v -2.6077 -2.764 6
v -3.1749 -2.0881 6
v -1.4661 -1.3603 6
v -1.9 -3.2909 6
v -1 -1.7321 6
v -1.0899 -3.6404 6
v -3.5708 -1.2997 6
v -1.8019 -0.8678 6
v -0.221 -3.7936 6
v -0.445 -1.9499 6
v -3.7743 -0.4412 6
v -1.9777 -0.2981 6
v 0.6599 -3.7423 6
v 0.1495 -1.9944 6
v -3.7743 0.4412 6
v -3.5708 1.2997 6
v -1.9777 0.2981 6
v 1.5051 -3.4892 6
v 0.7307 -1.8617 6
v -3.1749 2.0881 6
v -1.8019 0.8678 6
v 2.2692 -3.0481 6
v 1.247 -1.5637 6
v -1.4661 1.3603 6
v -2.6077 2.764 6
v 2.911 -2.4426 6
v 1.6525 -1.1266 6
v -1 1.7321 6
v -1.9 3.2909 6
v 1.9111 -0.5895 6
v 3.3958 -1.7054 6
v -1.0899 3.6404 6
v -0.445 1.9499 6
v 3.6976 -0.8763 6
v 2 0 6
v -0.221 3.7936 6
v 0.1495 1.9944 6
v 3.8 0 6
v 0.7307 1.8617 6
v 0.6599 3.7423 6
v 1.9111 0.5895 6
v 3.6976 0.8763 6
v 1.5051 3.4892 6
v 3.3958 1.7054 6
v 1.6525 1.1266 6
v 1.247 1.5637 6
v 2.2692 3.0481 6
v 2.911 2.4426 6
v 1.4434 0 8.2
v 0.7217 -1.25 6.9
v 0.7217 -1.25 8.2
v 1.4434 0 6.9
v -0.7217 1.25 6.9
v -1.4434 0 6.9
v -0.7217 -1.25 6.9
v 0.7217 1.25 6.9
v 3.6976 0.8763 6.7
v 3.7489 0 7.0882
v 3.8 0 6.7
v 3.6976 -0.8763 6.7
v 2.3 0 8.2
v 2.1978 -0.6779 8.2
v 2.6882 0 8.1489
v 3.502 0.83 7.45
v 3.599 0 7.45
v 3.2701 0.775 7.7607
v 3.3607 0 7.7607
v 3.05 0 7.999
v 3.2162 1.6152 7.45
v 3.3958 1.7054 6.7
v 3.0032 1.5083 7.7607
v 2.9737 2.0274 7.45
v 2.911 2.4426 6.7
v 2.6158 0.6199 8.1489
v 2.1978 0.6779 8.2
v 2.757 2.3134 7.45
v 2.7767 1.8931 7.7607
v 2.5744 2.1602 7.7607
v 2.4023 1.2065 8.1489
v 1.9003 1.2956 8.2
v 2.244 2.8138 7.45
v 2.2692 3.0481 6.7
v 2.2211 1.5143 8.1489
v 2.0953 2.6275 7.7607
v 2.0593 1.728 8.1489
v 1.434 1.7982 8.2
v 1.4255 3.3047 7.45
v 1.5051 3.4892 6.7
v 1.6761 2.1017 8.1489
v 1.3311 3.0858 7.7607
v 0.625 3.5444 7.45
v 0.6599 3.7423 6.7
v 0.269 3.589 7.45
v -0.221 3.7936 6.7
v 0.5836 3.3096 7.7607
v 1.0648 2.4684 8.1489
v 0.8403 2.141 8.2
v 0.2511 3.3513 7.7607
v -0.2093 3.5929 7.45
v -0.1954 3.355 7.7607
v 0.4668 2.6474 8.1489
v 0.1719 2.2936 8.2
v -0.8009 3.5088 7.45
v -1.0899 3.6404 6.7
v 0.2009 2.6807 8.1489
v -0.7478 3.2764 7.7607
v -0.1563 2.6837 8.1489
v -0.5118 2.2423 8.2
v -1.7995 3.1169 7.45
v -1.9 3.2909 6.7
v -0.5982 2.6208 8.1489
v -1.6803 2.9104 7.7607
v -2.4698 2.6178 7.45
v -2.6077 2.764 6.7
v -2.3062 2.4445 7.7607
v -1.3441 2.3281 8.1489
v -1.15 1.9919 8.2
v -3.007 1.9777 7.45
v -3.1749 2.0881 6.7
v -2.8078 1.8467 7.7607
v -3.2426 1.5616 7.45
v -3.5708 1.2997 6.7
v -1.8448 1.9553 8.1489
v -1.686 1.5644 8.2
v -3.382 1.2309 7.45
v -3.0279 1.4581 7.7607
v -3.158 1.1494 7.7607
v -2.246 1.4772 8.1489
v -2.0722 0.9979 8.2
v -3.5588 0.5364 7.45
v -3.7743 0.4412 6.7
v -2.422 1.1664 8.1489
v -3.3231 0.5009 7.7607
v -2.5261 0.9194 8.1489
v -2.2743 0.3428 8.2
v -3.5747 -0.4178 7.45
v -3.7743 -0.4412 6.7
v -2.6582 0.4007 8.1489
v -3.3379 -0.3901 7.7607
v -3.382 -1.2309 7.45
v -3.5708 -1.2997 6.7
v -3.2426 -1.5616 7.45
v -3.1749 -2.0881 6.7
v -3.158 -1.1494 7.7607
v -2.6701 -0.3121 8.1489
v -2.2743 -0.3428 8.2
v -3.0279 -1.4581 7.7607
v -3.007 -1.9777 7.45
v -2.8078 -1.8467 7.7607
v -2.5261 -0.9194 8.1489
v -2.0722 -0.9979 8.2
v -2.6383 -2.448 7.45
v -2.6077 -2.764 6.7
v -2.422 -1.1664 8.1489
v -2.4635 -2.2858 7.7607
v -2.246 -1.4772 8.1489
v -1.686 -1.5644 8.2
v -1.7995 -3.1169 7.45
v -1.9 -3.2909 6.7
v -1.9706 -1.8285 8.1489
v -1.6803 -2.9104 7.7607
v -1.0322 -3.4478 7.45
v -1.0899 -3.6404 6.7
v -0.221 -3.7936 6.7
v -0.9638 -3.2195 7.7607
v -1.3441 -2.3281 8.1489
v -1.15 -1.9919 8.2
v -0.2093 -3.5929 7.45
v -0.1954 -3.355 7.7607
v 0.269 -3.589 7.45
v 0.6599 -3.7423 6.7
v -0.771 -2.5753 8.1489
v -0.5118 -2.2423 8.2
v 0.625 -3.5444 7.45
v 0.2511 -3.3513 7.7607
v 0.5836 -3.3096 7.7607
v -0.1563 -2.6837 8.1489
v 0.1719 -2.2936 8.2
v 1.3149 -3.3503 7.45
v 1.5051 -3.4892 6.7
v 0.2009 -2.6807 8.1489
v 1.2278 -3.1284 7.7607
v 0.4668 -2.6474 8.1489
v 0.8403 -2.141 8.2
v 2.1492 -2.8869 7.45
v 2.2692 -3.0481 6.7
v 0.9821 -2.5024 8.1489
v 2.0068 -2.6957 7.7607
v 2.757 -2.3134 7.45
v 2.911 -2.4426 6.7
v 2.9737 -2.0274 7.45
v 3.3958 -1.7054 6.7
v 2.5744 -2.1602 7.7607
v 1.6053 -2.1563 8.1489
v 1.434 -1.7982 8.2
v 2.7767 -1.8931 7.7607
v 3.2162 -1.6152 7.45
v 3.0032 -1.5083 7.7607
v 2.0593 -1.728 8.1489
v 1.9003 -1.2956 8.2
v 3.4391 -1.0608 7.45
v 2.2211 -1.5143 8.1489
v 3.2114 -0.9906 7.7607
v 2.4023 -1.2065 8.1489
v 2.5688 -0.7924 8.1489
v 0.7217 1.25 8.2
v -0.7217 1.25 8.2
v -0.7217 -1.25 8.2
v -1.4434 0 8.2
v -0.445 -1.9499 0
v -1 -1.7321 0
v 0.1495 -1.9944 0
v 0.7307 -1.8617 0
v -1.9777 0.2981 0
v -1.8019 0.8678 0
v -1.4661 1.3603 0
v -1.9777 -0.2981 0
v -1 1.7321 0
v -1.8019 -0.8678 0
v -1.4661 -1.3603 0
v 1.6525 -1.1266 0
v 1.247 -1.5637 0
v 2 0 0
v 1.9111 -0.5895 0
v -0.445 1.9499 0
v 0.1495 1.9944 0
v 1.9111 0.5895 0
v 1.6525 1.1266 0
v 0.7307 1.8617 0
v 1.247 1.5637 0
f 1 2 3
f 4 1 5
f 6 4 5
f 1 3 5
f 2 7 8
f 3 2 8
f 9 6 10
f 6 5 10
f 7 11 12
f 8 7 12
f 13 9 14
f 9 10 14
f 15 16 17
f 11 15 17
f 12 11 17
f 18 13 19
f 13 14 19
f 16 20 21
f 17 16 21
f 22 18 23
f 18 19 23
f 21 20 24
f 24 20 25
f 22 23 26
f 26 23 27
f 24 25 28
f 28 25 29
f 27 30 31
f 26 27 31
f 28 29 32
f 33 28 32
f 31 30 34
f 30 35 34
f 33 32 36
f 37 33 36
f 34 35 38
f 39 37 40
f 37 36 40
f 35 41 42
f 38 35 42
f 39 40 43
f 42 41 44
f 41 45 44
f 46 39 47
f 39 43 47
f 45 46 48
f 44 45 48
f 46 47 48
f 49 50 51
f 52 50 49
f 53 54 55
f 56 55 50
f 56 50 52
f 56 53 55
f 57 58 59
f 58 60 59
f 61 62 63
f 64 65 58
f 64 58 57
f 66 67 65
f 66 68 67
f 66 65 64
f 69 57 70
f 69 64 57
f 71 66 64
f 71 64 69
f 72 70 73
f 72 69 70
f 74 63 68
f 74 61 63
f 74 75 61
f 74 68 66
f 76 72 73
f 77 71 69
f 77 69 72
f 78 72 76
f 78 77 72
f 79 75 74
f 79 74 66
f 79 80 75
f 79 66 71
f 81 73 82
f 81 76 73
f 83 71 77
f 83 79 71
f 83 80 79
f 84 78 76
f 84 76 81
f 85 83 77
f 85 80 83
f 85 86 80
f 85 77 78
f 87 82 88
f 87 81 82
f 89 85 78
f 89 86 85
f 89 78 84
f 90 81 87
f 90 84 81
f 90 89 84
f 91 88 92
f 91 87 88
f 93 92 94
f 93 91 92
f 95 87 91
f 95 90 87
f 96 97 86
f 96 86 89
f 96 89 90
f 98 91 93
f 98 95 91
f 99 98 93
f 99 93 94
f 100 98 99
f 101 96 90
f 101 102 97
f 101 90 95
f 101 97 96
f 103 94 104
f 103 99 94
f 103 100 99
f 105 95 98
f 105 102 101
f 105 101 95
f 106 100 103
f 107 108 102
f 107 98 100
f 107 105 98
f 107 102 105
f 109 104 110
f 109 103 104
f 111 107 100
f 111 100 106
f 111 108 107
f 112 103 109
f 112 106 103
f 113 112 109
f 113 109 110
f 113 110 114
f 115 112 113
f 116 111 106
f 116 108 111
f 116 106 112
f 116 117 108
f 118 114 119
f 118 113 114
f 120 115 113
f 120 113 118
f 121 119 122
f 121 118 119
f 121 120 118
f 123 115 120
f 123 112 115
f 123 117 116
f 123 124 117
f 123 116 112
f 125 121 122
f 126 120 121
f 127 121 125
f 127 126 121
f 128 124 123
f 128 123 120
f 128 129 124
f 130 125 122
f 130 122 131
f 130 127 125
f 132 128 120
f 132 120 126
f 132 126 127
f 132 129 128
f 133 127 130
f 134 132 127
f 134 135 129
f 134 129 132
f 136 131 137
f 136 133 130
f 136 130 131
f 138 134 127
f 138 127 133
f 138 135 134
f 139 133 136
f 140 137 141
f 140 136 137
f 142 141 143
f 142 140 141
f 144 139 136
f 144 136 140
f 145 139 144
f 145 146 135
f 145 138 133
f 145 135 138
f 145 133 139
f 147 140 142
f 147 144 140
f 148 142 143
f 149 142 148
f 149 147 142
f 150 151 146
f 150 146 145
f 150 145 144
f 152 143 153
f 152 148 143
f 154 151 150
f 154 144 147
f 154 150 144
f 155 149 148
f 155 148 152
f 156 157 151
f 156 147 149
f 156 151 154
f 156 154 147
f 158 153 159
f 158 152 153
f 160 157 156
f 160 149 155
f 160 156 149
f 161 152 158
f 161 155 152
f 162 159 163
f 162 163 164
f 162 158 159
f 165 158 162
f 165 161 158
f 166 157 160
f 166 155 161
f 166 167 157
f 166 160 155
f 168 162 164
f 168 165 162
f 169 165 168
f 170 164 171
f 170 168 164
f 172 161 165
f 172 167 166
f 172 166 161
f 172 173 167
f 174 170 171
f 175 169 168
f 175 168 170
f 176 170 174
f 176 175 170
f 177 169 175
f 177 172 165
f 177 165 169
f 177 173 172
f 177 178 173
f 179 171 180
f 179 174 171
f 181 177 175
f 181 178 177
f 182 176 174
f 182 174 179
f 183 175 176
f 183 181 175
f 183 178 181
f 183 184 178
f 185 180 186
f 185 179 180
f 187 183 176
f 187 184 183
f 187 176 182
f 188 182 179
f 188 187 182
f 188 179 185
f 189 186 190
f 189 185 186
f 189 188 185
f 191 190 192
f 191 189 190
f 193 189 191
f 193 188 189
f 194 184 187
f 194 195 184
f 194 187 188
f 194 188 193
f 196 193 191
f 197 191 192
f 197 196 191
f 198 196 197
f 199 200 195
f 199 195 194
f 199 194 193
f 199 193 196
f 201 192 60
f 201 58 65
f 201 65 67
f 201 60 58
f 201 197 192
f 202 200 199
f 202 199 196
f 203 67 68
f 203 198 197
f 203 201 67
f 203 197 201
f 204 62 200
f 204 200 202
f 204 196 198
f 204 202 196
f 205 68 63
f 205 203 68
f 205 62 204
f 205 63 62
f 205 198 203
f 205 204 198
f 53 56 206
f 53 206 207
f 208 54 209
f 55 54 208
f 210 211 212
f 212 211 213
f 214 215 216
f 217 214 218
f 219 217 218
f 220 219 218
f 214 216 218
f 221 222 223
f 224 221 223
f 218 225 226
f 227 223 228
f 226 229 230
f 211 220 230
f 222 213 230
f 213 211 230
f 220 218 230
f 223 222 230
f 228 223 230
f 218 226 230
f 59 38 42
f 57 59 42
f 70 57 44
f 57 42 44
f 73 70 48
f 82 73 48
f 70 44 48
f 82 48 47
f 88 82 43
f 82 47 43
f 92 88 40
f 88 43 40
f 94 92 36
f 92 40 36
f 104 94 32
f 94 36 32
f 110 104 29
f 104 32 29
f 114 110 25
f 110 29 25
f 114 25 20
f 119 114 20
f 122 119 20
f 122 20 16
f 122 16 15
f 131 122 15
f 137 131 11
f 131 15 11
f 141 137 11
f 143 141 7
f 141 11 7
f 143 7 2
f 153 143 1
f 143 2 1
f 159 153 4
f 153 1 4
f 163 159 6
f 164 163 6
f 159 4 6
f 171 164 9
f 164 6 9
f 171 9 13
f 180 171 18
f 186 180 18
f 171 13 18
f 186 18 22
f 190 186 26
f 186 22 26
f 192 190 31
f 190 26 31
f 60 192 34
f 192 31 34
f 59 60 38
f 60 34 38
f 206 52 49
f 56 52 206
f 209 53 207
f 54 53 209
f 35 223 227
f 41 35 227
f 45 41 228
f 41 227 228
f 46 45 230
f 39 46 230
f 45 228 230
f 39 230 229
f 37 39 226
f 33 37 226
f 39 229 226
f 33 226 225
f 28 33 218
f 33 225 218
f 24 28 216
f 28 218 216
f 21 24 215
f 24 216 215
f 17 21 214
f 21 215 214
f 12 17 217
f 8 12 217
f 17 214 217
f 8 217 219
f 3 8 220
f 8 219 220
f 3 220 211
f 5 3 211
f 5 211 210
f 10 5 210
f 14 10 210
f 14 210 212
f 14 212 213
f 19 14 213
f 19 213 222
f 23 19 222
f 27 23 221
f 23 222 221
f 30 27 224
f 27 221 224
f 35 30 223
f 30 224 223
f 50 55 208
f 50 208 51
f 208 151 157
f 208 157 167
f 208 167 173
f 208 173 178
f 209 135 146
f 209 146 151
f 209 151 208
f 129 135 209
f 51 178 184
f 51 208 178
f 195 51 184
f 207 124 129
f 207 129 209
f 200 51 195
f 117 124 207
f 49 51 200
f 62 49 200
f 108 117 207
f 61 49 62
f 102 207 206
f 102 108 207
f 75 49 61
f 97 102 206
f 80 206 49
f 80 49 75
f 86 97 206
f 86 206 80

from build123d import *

# Parameters (mm, degrees)
SKETCH1_R      = 2
SHANK_DEPTH    = 6
SKETCH2_R      = 3.8
HEAD_DEPTH     = 2.2
BUTTON_ROUND_R = 1.5
SOCKET_DEPTH   = 1.3


with BuildPart() as part:
    # Sketch1 → Shank (new body)
    with BuildSketch(Plane.XY):
        Circle(SKETCH1_R)
    extrude(amount=SHANK_DEPTH)

    # Sketch2 → Head (add)
    with BuildSketch(Plane.XY.offset(6)):
        Circle(SKETCH2_R)
    extrude(amount=HEAD_DEPTH)

    # Button_round
    button_round_edges = [part.edges().sort_by_distance(p)[0] for p in [
        (-3.8, 0, 8.2),
    ]]
    fillet(button_round_edges, radius=BUTTON_ROUND_R)

    # Sketch3 → Socket (cut)
    with BuildSketch(Plane.XY.offset(6.9)):
        Polygon((1.443375673, 0), (0.721687836, 1.25), (-0.721687836, 1.25), (-1.443375673, 0), (-0.721687836, -1.25), (0.721687836, -1.25), align=None)
    extrude(amount=SOCKET_DEPTH, mode=Mode.SUBTRACT)


solid = part.part
